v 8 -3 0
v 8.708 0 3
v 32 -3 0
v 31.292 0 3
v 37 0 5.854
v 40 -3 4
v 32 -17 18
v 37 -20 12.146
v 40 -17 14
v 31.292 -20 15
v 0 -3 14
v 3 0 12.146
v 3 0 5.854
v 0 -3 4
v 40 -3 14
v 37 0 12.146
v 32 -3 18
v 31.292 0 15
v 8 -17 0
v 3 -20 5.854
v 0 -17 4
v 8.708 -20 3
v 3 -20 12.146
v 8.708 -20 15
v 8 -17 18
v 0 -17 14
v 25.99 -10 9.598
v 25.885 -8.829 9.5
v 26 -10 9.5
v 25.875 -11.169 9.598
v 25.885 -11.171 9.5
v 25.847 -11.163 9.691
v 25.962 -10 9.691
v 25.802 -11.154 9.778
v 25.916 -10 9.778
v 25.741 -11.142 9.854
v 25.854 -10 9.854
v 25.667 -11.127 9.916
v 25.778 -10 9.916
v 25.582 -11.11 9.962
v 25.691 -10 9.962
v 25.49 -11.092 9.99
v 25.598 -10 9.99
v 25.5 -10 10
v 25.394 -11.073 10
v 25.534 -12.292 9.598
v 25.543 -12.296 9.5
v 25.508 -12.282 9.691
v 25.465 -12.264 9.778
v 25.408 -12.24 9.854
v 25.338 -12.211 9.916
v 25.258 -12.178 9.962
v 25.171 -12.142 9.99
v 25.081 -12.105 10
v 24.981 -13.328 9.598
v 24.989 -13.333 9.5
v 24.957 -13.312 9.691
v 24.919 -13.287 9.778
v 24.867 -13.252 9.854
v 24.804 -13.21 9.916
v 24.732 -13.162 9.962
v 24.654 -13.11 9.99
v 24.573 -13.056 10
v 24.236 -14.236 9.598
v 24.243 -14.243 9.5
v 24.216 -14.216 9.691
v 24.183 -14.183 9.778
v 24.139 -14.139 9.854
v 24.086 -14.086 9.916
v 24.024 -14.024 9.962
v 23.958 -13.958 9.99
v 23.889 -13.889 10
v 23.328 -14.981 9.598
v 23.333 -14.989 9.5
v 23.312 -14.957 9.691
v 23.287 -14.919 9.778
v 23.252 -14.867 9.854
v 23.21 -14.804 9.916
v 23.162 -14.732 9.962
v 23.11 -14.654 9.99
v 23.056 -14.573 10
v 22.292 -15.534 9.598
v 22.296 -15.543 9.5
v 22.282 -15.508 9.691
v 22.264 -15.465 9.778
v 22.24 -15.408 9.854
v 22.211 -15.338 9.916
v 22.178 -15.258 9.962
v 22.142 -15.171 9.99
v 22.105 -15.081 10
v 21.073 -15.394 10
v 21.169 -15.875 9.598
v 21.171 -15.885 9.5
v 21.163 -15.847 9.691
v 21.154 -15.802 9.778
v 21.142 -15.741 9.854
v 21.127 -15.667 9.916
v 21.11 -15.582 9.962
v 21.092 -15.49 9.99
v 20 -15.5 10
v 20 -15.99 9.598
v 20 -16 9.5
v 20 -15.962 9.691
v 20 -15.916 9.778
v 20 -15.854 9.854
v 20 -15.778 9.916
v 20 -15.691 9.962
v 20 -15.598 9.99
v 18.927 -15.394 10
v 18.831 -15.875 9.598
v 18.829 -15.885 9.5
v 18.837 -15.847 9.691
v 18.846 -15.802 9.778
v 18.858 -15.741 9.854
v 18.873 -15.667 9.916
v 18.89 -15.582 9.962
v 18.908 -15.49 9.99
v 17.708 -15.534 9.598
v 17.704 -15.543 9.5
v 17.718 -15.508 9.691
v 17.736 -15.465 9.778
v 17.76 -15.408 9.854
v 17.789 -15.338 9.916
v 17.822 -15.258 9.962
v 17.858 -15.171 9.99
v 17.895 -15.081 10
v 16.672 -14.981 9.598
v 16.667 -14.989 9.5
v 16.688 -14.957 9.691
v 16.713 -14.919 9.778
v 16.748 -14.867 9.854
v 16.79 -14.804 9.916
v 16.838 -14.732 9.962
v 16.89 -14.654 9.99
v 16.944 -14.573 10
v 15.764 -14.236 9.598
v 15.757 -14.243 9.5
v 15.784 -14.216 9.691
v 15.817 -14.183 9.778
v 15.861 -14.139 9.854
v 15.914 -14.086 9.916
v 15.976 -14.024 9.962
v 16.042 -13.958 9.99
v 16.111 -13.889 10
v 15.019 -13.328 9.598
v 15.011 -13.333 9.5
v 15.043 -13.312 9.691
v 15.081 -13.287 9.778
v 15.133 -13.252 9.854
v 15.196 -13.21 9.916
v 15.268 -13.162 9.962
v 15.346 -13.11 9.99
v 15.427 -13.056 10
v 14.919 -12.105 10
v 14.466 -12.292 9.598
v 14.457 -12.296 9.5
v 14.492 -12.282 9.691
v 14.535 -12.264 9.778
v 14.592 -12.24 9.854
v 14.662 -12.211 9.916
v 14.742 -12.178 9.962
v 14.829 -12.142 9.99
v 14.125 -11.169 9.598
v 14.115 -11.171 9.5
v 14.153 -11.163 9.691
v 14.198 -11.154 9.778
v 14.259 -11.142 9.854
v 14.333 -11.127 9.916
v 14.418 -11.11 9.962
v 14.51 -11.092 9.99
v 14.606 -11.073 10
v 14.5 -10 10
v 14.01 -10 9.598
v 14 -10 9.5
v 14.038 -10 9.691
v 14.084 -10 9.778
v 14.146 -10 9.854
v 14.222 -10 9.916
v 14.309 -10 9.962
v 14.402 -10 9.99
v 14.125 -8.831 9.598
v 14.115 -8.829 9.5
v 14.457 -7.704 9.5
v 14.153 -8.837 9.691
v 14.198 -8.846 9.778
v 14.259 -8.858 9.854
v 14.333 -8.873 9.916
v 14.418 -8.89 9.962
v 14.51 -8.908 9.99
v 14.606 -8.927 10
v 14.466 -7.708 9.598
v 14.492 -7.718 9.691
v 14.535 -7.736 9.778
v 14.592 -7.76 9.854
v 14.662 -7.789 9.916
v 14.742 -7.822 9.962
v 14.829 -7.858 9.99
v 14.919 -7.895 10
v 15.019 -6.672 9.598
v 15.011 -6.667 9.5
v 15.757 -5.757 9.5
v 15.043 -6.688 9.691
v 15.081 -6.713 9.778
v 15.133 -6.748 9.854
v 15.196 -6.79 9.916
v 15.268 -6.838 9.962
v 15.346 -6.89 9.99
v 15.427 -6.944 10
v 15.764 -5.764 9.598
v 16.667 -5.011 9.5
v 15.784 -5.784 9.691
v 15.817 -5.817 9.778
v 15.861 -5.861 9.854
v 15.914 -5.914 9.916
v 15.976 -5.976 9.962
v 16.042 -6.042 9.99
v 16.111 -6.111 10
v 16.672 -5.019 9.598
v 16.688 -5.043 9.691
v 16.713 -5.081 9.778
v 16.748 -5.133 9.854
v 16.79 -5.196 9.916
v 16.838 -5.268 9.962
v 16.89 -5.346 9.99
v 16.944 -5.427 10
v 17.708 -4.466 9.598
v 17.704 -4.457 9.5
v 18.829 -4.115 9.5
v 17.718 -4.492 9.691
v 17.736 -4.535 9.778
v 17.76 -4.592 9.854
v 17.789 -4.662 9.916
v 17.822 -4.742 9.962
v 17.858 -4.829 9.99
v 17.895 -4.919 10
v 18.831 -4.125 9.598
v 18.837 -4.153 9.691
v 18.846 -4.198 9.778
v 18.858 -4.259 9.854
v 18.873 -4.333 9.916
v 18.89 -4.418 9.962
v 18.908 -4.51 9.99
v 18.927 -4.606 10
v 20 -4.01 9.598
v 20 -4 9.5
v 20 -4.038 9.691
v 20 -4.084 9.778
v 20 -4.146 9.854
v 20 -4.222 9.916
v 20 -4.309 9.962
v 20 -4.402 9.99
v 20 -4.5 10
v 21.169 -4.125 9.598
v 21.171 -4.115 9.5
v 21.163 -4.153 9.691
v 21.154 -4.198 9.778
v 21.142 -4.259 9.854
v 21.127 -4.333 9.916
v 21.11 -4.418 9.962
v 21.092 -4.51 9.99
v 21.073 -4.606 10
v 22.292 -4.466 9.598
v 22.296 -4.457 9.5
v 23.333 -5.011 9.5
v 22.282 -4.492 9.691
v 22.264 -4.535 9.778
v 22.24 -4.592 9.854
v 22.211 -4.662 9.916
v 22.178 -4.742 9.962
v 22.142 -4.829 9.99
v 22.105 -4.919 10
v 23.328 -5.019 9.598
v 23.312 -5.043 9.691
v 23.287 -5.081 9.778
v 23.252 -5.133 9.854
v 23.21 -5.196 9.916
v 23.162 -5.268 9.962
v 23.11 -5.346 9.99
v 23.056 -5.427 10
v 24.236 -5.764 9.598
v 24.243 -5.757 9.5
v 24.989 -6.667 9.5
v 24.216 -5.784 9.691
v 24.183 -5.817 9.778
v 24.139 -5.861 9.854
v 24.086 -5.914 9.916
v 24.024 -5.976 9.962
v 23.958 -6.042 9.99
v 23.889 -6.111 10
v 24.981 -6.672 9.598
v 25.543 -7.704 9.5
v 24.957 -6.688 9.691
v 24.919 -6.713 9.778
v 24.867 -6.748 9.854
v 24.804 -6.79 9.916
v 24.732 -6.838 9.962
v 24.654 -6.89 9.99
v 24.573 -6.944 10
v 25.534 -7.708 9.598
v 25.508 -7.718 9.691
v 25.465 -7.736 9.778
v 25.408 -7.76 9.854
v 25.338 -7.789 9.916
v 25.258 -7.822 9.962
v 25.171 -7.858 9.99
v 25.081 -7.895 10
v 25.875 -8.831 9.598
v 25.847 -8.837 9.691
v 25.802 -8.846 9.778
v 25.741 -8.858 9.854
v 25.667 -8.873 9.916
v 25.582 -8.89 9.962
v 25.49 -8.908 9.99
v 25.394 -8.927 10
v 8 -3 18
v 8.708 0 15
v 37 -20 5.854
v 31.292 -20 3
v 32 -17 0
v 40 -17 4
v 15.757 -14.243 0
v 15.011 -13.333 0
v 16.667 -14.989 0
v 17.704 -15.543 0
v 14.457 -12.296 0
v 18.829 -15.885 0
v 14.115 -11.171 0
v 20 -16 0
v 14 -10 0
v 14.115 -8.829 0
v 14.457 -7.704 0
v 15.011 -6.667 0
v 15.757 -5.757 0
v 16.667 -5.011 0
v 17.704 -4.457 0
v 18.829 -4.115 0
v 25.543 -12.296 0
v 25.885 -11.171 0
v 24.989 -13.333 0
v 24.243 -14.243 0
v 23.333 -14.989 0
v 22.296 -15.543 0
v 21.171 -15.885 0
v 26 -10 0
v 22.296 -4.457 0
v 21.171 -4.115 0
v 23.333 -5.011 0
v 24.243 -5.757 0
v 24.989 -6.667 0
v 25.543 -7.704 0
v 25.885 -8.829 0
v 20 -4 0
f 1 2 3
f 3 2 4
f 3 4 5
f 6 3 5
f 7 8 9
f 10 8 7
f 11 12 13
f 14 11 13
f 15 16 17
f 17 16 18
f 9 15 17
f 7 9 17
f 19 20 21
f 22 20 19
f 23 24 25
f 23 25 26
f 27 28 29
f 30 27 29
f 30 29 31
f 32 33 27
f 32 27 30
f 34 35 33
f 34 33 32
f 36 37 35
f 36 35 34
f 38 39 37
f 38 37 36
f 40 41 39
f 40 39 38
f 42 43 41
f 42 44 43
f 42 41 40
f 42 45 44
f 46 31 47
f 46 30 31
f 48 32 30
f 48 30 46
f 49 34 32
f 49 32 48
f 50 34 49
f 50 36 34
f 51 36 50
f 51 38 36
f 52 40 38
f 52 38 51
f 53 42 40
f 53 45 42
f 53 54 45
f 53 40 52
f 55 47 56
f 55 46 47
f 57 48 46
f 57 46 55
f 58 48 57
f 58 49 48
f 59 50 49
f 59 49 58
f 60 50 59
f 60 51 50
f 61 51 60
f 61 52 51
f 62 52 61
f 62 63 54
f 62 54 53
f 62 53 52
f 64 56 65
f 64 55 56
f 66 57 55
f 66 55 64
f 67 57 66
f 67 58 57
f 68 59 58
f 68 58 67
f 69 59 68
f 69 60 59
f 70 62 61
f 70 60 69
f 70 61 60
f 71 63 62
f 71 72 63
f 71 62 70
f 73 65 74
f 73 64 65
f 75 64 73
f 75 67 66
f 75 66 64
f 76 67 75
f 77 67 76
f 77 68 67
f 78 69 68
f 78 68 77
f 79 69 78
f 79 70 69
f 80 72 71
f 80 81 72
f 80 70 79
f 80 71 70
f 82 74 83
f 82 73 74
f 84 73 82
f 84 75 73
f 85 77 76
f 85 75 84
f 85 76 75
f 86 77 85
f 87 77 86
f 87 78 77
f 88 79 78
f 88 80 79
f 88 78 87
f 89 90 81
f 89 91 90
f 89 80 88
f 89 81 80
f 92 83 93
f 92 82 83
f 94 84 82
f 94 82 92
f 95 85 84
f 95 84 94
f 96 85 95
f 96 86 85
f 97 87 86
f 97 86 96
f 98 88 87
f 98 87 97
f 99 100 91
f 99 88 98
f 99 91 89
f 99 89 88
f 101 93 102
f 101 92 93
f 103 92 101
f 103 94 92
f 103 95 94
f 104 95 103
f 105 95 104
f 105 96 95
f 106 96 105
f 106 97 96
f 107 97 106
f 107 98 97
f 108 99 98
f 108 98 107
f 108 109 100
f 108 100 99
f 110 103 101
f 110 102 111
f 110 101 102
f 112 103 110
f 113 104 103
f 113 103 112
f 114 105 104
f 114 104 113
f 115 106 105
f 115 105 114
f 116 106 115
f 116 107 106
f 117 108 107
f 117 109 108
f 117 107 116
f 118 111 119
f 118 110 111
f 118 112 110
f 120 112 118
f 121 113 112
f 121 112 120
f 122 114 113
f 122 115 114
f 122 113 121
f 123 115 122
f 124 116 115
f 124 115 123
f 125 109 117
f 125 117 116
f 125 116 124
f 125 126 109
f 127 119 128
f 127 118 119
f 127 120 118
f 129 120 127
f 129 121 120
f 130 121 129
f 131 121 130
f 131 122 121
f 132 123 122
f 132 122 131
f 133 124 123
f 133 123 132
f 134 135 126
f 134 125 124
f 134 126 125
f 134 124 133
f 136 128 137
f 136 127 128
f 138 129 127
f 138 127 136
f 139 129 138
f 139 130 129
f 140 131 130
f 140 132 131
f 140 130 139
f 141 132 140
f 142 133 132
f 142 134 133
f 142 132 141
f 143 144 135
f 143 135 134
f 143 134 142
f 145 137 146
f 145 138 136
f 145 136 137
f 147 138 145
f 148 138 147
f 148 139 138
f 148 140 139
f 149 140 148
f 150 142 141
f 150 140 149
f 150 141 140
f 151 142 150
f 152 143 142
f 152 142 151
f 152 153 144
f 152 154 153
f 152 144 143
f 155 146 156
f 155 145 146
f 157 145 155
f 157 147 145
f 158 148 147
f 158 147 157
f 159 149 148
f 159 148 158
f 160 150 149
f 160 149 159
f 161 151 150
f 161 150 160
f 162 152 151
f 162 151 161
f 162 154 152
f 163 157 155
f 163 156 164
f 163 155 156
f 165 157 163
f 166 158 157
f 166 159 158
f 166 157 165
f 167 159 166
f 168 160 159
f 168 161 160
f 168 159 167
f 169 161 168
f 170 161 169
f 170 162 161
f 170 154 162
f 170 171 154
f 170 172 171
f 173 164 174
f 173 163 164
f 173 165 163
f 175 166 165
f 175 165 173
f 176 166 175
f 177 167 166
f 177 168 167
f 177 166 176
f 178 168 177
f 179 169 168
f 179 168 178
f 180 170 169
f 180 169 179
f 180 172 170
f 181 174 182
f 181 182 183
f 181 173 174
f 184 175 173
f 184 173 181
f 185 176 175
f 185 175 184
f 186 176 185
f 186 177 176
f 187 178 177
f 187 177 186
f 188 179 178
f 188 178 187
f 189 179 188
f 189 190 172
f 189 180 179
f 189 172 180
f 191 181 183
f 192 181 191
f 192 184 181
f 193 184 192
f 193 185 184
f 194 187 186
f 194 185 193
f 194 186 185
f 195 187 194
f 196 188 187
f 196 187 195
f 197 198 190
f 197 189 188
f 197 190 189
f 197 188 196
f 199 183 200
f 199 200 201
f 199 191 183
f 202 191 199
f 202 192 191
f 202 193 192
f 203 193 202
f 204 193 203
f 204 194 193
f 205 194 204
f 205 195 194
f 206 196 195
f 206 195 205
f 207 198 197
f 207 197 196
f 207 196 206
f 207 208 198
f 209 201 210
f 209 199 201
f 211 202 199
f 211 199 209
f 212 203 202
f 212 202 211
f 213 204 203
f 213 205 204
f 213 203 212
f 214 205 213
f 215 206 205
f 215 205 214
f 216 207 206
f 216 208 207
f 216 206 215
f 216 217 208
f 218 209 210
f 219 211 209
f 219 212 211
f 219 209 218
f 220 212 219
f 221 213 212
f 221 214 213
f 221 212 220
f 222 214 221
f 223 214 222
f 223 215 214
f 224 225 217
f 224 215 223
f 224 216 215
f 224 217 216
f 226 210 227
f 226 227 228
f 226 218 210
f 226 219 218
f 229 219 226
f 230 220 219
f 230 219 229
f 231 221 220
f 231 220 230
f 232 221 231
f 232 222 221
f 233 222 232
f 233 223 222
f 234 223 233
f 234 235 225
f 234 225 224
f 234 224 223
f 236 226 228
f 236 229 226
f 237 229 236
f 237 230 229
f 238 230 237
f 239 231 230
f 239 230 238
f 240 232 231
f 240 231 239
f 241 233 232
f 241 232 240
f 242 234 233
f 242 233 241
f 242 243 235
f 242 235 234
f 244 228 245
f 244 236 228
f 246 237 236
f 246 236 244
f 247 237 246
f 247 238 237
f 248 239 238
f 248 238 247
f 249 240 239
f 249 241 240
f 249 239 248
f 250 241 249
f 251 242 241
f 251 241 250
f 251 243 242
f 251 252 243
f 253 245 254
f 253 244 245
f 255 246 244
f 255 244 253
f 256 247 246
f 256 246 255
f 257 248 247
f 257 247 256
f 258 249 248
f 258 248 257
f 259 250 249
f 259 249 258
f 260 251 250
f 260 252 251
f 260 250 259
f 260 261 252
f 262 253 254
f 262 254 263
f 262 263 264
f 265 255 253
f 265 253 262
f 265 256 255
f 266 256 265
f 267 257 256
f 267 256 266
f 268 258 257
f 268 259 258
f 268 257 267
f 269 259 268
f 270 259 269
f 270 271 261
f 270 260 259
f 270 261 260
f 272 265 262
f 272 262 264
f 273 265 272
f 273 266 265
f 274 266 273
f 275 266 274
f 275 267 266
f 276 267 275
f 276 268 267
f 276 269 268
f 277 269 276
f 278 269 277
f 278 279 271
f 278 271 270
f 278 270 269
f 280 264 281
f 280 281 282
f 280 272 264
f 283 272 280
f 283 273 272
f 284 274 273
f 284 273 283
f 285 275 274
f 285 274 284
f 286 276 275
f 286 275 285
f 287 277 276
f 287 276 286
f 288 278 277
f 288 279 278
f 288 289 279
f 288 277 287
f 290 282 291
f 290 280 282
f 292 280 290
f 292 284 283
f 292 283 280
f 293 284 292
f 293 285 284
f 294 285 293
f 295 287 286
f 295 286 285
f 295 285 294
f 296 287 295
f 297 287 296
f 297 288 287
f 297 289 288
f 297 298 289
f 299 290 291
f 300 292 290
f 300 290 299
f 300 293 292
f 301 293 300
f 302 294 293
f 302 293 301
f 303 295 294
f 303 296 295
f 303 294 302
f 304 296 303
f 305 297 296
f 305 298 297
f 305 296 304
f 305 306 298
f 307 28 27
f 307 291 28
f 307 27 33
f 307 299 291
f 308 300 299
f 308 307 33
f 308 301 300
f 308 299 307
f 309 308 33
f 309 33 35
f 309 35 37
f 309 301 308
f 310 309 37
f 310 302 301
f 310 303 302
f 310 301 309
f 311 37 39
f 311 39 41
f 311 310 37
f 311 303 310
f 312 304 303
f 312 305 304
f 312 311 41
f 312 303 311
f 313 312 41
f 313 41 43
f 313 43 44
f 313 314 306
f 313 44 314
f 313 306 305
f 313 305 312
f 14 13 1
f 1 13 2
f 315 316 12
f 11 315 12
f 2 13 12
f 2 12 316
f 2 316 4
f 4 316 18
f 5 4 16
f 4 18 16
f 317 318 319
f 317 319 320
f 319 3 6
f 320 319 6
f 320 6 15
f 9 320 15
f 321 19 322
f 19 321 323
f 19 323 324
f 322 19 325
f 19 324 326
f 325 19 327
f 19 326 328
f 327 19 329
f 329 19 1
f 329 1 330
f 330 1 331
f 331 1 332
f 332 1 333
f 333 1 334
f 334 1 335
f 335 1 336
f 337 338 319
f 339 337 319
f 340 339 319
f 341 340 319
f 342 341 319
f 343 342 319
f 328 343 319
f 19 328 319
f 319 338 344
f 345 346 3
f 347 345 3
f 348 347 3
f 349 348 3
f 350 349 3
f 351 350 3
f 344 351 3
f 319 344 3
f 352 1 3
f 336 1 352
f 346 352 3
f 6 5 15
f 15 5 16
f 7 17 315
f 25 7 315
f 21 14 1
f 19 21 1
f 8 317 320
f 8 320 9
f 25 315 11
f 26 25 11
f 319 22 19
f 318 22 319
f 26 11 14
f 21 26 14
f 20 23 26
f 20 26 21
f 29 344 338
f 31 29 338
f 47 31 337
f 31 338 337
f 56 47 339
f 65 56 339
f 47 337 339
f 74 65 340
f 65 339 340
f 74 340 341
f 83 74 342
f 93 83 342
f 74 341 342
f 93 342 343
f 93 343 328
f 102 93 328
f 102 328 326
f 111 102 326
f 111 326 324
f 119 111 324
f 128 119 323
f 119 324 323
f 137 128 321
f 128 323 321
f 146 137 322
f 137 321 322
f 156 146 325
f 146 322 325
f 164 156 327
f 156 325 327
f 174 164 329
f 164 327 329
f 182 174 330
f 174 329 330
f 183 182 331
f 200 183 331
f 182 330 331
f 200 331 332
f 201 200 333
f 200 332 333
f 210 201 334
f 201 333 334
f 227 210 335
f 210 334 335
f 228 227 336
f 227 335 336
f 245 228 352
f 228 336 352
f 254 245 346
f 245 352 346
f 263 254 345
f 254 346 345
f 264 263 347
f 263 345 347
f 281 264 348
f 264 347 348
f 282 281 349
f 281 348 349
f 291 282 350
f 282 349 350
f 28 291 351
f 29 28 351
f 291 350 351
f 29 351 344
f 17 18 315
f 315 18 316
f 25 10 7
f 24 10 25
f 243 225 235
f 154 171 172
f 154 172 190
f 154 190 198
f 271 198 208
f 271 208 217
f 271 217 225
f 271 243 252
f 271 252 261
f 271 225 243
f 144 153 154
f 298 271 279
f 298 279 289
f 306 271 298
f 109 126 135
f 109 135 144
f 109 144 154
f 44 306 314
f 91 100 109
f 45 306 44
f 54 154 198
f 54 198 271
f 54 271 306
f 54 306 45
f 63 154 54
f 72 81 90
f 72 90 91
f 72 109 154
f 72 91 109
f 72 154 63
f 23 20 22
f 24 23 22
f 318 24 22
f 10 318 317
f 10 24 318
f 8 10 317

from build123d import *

# Parameters (mm, degrees)
F1_DEPTH = 20
F2_SIZE  = 3
F3_R     = 6
F4_DEPTH = 10
F5_R     = 0.5


with BuildPart() as f1:
    # F0 (on Front) → F1 (new body)
    with BuildSketch(Plane.XZ):
        Polygon((0, 4), (8, 0), (32, 0), (40, 4), (40, 14), (32, 18), (8, 18), (0, 14), align=None)
    extrude(amount=F1_DEPTH)

    # F2
    f2_edges = [f1.edges().sort_by_distance(p)[0] for p in [
        (4, -20, 2),
        (20, -20, 0),
        (36, -20, 2),
        (40, -20, 9),
        (36, -20, 16),
        (20, -20, 18),
        (4, -20, 16),
        (0, -20, 9),
        (4, 0, 2),
        (20, 0, 0),
        (36, 0, 2),
        (40, 0, 9),
        (36, 0, 16),
        (20, 0, 18),
        (4, 0, 16),
        (0, 0, 9),
    ]]
    chamfer(f2_edges, length=F2_SIZE)

    # F3 (on face) → F4 (cut)
    with BuildSketch(Plane(origin=(0, 0, 0), x_dir=(1, 0, 0), z_dir=(0, 0, -1))):
        with Locations((20, 10)):
            Circle(F3_R)
    extrude(amount=-F4_DEPTH, mode=Mode.SUBTRACT)

    # F5
    f5_edges = [f1.edges().sort_by_distance(p)[0] for p in [
        (14, -10, 10),
    ]]
    fillet(f5_edges, radius=F5_R)


solid = f1.part
